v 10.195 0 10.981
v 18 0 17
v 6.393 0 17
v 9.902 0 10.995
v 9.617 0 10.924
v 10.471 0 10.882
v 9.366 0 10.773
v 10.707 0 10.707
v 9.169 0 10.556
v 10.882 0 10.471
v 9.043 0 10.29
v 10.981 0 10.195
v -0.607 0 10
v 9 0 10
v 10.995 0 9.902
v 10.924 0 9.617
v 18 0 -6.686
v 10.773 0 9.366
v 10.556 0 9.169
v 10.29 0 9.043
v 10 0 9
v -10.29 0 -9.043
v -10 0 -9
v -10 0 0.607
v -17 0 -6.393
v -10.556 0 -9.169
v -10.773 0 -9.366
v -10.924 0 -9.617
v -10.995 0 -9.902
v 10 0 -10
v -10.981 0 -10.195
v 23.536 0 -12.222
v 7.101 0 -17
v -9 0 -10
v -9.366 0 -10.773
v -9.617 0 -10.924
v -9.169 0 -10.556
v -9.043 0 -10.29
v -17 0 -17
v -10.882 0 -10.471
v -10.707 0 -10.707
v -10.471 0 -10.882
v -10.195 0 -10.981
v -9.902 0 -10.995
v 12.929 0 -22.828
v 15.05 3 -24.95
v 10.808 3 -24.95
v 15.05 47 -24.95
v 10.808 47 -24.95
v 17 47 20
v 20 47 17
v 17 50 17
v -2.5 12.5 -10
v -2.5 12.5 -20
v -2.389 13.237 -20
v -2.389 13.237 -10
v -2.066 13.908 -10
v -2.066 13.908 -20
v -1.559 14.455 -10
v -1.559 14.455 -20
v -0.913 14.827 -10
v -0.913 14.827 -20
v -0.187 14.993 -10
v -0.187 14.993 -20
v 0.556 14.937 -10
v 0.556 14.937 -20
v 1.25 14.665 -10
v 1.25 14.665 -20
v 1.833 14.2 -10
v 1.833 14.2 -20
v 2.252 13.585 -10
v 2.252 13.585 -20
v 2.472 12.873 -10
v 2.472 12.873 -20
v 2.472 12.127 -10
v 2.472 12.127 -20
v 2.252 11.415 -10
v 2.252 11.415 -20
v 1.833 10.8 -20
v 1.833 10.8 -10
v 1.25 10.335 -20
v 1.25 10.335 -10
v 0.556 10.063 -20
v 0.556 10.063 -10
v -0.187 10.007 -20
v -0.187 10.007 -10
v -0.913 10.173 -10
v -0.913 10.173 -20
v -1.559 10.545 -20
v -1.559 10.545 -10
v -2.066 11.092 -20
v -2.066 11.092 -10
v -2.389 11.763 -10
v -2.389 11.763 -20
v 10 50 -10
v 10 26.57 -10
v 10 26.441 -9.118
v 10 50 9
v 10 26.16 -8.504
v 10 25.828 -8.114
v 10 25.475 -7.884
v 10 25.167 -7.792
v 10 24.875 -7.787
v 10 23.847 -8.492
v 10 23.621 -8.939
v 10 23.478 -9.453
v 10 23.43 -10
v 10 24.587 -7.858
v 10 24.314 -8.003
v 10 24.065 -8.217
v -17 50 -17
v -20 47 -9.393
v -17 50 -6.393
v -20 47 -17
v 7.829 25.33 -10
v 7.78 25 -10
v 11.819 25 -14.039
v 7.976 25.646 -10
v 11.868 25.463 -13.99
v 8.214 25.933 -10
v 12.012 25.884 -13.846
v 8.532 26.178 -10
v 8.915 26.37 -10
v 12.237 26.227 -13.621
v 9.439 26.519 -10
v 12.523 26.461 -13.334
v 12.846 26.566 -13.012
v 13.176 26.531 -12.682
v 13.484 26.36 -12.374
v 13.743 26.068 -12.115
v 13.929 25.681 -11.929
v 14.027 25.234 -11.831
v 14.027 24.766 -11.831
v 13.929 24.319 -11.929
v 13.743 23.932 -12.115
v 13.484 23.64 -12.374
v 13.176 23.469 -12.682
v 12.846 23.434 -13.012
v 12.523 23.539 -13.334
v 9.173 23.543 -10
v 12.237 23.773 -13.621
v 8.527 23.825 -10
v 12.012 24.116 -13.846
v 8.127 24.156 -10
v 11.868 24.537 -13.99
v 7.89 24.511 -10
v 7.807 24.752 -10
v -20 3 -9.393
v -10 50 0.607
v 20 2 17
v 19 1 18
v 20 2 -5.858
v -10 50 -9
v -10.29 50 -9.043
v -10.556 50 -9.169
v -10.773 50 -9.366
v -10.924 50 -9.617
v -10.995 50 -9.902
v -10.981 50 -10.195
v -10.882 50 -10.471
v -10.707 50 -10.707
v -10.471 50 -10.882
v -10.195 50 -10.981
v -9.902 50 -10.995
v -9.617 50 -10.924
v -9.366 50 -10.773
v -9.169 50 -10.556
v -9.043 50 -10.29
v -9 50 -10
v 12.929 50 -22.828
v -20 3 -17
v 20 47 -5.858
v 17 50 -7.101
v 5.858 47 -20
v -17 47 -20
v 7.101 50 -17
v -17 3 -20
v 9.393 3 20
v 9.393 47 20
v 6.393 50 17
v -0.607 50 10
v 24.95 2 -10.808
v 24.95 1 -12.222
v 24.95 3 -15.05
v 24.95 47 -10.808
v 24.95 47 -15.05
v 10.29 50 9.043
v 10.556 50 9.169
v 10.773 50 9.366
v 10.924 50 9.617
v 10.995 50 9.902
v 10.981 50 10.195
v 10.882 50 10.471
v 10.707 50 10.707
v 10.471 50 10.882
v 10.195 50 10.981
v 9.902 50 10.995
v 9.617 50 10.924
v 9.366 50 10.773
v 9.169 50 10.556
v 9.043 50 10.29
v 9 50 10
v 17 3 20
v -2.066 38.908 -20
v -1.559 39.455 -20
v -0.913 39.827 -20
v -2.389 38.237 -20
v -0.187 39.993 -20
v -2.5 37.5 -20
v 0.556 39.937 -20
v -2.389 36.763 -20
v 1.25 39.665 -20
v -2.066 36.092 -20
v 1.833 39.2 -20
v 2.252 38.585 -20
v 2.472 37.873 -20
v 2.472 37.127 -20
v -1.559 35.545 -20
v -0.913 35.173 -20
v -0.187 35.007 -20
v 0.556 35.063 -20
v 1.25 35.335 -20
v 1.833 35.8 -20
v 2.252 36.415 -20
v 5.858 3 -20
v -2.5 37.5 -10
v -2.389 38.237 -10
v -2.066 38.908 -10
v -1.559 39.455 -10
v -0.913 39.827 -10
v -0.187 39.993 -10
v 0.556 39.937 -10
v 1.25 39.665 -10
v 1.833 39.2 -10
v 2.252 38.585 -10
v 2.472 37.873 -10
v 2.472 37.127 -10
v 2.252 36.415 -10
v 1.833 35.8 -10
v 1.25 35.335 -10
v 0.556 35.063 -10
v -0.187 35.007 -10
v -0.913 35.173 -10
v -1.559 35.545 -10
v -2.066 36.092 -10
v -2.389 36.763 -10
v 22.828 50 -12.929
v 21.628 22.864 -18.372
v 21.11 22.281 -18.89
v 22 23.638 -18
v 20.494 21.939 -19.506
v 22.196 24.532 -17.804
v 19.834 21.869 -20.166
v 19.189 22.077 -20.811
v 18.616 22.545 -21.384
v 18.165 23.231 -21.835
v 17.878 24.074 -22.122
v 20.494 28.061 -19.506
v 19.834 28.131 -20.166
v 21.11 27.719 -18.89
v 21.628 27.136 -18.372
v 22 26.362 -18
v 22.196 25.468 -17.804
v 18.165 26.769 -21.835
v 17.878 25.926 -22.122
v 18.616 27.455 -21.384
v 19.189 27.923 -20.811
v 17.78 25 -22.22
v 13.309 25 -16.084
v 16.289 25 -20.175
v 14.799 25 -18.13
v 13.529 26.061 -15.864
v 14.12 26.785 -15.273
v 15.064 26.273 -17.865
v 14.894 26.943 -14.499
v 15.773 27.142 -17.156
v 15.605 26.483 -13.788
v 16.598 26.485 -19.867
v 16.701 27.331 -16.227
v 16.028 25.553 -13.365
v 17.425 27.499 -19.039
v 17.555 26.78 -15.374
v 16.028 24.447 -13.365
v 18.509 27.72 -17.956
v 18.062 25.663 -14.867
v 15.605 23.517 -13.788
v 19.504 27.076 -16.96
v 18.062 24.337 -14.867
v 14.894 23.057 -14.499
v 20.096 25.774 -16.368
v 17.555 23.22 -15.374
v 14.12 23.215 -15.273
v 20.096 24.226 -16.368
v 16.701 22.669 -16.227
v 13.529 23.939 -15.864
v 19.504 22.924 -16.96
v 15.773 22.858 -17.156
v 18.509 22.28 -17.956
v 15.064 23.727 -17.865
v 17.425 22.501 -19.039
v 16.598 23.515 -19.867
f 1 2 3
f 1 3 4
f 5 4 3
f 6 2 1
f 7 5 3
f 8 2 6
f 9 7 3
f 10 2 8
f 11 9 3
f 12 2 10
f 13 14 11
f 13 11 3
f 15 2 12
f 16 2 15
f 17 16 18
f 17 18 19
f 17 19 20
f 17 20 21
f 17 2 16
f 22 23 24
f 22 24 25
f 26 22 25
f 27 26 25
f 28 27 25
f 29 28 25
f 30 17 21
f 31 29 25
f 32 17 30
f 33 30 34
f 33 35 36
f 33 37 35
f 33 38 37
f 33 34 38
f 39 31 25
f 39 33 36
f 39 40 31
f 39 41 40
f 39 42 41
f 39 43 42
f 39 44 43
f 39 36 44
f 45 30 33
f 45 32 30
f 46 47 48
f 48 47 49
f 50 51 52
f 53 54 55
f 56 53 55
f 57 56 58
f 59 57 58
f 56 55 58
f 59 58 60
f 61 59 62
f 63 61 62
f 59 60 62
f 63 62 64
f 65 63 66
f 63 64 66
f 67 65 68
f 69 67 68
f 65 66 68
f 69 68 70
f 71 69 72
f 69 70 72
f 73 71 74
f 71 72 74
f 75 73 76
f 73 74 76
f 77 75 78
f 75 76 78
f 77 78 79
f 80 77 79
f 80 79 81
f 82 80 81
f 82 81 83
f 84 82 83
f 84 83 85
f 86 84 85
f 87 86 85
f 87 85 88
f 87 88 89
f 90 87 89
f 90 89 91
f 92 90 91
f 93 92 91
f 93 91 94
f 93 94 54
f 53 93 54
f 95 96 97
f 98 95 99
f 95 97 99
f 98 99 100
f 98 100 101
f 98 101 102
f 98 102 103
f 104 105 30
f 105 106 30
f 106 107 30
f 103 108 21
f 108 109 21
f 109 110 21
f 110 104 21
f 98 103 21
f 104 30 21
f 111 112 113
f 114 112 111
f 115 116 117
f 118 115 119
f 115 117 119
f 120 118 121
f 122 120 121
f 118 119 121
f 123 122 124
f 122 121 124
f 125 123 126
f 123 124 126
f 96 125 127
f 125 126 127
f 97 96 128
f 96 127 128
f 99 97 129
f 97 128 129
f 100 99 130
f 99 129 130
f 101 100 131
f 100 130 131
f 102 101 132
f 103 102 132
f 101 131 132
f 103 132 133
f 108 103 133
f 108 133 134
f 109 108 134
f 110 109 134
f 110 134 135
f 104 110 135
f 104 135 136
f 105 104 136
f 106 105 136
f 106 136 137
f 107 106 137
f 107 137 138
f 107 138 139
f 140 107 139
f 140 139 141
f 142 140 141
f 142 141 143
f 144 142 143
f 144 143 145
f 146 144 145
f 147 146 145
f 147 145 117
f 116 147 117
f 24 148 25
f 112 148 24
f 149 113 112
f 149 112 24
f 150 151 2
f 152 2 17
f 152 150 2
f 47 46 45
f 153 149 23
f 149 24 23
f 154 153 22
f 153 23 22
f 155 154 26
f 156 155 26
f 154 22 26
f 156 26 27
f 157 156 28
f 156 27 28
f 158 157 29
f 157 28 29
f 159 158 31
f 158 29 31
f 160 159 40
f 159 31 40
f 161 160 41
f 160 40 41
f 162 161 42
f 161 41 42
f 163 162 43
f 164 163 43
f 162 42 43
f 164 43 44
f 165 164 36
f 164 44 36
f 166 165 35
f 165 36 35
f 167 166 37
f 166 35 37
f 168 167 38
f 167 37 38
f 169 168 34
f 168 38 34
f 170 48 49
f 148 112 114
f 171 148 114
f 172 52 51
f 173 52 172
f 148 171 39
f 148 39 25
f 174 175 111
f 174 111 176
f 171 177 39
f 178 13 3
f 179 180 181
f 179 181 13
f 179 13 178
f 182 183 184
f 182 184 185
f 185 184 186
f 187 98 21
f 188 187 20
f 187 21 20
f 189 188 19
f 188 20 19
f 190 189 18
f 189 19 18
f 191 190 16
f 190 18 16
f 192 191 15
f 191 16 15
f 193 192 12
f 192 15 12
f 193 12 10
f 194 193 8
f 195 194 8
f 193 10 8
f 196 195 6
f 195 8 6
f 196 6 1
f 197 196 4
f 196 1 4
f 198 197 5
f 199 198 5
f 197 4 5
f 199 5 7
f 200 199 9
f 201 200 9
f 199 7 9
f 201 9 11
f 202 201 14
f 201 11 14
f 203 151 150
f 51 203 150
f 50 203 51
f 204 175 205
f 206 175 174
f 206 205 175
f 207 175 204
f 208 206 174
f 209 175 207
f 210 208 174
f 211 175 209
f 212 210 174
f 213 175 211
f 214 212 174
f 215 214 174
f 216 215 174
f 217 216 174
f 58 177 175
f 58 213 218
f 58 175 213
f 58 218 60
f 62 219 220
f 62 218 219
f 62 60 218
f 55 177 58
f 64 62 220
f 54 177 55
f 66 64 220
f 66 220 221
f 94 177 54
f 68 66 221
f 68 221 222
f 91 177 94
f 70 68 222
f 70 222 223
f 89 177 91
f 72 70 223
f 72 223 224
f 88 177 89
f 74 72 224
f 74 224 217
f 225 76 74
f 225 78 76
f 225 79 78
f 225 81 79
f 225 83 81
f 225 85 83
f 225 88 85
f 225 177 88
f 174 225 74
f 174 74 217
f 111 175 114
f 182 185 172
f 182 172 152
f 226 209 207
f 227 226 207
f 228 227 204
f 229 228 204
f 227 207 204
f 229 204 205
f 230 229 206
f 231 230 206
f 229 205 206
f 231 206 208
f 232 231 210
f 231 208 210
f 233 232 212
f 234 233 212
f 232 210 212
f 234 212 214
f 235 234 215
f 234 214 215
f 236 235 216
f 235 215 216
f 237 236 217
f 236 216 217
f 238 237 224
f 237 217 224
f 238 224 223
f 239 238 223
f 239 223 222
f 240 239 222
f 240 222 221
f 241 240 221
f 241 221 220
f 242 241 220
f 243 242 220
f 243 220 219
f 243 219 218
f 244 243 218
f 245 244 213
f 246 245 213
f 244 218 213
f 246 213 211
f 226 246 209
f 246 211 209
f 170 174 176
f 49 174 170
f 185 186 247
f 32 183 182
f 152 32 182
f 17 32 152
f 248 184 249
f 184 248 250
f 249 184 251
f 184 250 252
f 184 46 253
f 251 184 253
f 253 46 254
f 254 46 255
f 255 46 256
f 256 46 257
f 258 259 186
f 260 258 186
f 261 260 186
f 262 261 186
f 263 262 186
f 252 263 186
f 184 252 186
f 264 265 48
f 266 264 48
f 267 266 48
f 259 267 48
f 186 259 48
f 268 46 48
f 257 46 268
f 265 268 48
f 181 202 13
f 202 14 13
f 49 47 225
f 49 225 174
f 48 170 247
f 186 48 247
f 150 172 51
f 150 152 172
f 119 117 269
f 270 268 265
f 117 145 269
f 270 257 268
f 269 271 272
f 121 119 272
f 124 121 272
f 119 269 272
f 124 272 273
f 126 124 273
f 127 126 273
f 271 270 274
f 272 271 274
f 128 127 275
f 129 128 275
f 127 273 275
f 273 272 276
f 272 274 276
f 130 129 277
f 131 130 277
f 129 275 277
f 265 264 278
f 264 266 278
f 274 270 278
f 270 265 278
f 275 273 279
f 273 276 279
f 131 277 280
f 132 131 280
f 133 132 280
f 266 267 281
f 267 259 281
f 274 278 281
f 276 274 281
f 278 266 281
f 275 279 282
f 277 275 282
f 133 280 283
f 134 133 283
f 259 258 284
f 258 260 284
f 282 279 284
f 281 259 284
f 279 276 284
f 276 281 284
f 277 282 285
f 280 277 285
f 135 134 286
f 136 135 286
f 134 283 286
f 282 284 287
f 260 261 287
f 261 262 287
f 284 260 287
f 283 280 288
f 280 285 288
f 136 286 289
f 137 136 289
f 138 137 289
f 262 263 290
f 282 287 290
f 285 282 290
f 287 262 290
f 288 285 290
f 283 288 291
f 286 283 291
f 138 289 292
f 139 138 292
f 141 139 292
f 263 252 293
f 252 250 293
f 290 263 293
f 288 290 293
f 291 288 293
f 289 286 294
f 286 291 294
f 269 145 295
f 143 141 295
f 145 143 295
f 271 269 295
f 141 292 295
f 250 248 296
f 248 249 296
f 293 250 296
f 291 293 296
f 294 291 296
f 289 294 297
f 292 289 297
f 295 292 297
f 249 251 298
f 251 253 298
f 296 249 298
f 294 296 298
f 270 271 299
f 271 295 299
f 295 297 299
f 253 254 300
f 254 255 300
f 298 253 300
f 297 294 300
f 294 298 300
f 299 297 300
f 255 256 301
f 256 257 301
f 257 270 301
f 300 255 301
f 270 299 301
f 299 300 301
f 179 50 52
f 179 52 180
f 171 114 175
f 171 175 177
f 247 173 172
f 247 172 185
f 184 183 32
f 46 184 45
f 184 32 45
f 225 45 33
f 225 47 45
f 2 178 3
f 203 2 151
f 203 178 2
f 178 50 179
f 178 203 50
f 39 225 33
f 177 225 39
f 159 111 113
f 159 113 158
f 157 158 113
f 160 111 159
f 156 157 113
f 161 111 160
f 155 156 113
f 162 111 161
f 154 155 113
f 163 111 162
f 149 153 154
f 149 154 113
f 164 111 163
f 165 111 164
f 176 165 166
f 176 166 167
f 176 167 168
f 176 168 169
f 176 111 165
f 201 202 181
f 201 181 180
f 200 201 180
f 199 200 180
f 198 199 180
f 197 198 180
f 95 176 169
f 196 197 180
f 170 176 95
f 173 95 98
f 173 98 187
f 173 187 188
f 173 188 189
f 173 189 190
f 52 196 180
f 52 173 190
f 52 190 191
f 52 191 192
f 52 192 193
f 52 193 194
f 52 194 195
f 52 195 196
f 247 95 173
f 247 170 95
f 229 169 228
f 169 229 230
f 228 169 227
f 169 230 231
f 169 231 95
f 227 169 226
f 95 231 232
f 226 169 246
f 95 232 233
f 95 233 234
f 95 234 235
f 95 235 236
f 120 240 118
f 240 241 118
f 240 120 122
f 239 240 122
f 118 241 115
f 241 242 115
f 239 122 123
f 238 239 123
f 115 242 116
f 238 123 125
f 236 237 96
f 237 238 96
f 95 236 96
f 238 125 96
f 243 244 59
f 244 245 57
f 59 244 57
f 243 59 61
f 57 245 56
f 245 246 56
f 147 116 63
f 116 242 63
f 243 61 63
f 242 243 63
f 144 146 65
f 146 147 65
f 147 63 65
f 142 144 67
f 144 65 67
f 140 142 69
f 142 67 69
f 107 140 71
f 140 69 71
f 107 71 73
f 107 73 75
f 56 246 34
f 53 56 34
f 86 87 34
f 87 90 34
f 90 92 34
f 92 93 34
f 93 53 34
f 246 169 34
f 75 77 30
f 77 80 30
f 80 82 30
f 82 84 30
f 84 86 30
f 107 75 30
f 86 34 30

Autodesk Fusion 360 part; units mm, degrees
sketch "Sketch1" plane through (0, 0, 0) normal (0, 1, 0) x (1, 0, 0)
  line L0 (-10, 10) -> (10, 10)
  line L1 (10, 10) -> (10, -10)
  line L2 (10, -10) -> (-10, -10)
  line L3 (-10, -10) -> (-10, 10)
  line L4 (-10, 10) -> (10, -10) construction
  line L5 (10, 10) -> (-10, -10) construction
  line L6 (20, 20) -> (20, -20)
  line L7 (20, -20) -> (-20, -20)
  line L8 (-20, -20) -> (-20, 20)
  line L9 (-20, 20) -> (20, 20)
  dimension "d1" = 20
  dimension "d2" = 20
  dimension "d3" = -10
extrude "Extrude1" add sketch "Sketch1" along normal blind 50 makes body 1
sketch "Sketch2" plane through (0, 50, 0) normal (0, 1, 0) x (-1, 0, 0)
  line L0 (-10, 10) -> (10, 10)
  line L1 (10, 10) -> (10, -10)
  line L2 (10, -10) -> (-10, -10)
  line L3 (-10, -10) -> (-10, 10)
  line L4 (20, -20) -> (20, 20)
  line L5 (20, 20) -> (-20, 20)
  line L6 (-20, 20) -> (-20, -20)
  line L7 (-20, -20) -> (20, -20)
ref_plane "WorkPlane1" through (-10, 25, -10) normal (-0.707107, 0, 0.707107) x (0, 1, 0)
ref_plane "WorkPlane2" through (-15.3033, 25, -4.6967) normal (-0.707107, 0, 0.707107) x (0, 1, 0)
split "Split1" by plane through (-15.3033, 25, -4.6967) normal (-0.707107, 0, 0.707107) bodies 1 makes body 2 at (-0.4044, 16.6667, 20)
ref_plane "WorkPlane3" through (20, 25, -20) normal (-0.707107, 0, 0.707107) x (0, 1, 0)
sketch "Sketch3" plane through (20, 25, -20) normal (-0.707107, 0, 0.707107) x (0, 1, 0)
  line L0 (25, -10) -> (-25, -10)
  line L1 (-25, -10) -> (-25, 10)
  line L2 (-25, 10) -> (25, 10)
  line L3 (25, 10) -> (25, -10)
extrude "Extrude2" add sketch "Sketch3" along normal blind 13 and the other way blind 0 bodies 1
sketch "Sketch4" plane through (20, 0, -20) normal (0.707107, 0, -0.707107) x (-0.707107, 0, -0.707107)
  line L0 (-10, 0) -> (10, 0)
  line L1 (10, 0) -> (10, 50)
  line L2 (10, 50) -> (-10, 50)
  line L3 (-10, 50) -> (-10, 0)
  circle A0 centre (0, 25) radius 3.14
  dimension "d13" = 6.28
ref_plane "WorkPlane4" through (12.9289, 25, -12.9289) normal (0.707107, 0, -0.707107) x (-0.707107, 0, -0.707107)
sketch "Sketch5" plane through (12.9289, 25, -12.9289) normal (0.707107, 0, -0.707107) x (-0.707107, 0, -0.707107)
  circle A0 centre (0, 0) radius 1.57
  dimension "d15" = 3.14
loft "Loft1" cut profiles "Sketch4", "Sketch5" section 1 contours A0 section 2 bodies 1
sketch "Sketch6" plane through (0, 0, -20) normal (0, 0, -1) x (-1, 0, 0)
  line L0 (-5.8579, 50) -> (-5.8579, 0)
  line L1 (-5.8579, 0) -> (20, 0)
  line L2 (20, 0) -> (20, 50)
  line L3 (20, 50) -> (-5.8579, 50)
  line L4 (10, 0) -> (-10, 0)
  line L5 (-10, 0) -> (-10, 50)
  line L6 (-10, 50) -> (10, 50)
  line L7 (10, 50) -> (10, 0)
  line L8 (10, 25) -> (-10, 25) construction
  line L9 (10, 12.5) -> (-10, 12.5) construction
  line L10 (0, 0) -> (0, 25) construction
  circle A0 centre (0, 12.5) radius 2.5
  circle A1 centre (0, 37.5) radius 2.5
  dimension "d16" = 5
extrude "Extrude3" cut sketch "Sketch6" against normal blind 21 contours A0 | A1 bodies 1
sketch "Sketch7" plane through (0, 0, 0) normal (0, -1, 0) x (1, 0, 0)
  line L0 (12.9289, -27.0711) -> (27.0711, -12.9289)
  line L1 (27.0711, -12.9289) -> (20, -5.8579)
  line L2 (20, -5.8579) -> (20, 20)
  line L3 (20, 20) -> (9.3934, 20)
  line L4 (9.3934, 20) -> (-0.6066, 10)
  line L5 (-0.6066, 10) -> (10, 10)
  line L6 (10, 10) -> (10, -10)
  line L7 (10, -10) -> (-10, -10)
  line L8 (-10, -10) -> (-10, 0.6066)
  line L9 (-10, 0.6066) -> (-20, -9.3934)
  line L10 (-20, -9.3934) -> (-20, -20)
  line L11 (-20, -20) -> (5.8579, -20)
  line L12 (5.8579, -20) -> (12.9289, -27.0711)
  circle A0 centre (-10, -10) radius 1
  circle A1 centre (10, 10) radius 1
  dimension "d21" = 2
  dimension "d22" = 2
extrude "Extrude4" cut sketch "Sketch7" against normal blind 53 contours L7 L8 A0 | L5 L6 A1 picked at (-9.3369, -10.0489) picked at (10, 10.6648) bodies 1
chamfer "Chamfer1" distance 3 angle 45 16 edges at (20, 25, 20) (27.0711, 25, -12.9289) (12.9289, 25, -27.0711) (20, 50, -20) (20, 0, -20) (20, 50, 7.0711) (23.5355, 50, -9.3934) (9.3934, 50, -23.5355) (-7.0711, 50, -20) (-20, 25, -20) (-7.0711, 0, -20) (9.3934, 0, -23.5355) (-20, 0, -14.6967) (14.6967, 0, 20) (-20, 50, -14.6967) (14.6967, 50, 20) on bodies 1
chamfer "Chamfer2" distance 2 angle 45 2 edges at (20, 0, 5.5711) (22.4749, 0, -8.3327) on bodies 1
extrude "Extrude5" cut 1 faces at (13.1588, 25.9211, -12.6991) along direction (-0.707107, 0, 0.707107) blind 17 on bodies 1 bodies 1
hidden bodies 2
equation "d1 = sqUARELENGTH"
equation "d2 = sqUARELENGTH"
equation "d3 = shellthickness"
equation "shellthickness = -10 mm"
equation "sqUARELENGTH = 20 mm"
